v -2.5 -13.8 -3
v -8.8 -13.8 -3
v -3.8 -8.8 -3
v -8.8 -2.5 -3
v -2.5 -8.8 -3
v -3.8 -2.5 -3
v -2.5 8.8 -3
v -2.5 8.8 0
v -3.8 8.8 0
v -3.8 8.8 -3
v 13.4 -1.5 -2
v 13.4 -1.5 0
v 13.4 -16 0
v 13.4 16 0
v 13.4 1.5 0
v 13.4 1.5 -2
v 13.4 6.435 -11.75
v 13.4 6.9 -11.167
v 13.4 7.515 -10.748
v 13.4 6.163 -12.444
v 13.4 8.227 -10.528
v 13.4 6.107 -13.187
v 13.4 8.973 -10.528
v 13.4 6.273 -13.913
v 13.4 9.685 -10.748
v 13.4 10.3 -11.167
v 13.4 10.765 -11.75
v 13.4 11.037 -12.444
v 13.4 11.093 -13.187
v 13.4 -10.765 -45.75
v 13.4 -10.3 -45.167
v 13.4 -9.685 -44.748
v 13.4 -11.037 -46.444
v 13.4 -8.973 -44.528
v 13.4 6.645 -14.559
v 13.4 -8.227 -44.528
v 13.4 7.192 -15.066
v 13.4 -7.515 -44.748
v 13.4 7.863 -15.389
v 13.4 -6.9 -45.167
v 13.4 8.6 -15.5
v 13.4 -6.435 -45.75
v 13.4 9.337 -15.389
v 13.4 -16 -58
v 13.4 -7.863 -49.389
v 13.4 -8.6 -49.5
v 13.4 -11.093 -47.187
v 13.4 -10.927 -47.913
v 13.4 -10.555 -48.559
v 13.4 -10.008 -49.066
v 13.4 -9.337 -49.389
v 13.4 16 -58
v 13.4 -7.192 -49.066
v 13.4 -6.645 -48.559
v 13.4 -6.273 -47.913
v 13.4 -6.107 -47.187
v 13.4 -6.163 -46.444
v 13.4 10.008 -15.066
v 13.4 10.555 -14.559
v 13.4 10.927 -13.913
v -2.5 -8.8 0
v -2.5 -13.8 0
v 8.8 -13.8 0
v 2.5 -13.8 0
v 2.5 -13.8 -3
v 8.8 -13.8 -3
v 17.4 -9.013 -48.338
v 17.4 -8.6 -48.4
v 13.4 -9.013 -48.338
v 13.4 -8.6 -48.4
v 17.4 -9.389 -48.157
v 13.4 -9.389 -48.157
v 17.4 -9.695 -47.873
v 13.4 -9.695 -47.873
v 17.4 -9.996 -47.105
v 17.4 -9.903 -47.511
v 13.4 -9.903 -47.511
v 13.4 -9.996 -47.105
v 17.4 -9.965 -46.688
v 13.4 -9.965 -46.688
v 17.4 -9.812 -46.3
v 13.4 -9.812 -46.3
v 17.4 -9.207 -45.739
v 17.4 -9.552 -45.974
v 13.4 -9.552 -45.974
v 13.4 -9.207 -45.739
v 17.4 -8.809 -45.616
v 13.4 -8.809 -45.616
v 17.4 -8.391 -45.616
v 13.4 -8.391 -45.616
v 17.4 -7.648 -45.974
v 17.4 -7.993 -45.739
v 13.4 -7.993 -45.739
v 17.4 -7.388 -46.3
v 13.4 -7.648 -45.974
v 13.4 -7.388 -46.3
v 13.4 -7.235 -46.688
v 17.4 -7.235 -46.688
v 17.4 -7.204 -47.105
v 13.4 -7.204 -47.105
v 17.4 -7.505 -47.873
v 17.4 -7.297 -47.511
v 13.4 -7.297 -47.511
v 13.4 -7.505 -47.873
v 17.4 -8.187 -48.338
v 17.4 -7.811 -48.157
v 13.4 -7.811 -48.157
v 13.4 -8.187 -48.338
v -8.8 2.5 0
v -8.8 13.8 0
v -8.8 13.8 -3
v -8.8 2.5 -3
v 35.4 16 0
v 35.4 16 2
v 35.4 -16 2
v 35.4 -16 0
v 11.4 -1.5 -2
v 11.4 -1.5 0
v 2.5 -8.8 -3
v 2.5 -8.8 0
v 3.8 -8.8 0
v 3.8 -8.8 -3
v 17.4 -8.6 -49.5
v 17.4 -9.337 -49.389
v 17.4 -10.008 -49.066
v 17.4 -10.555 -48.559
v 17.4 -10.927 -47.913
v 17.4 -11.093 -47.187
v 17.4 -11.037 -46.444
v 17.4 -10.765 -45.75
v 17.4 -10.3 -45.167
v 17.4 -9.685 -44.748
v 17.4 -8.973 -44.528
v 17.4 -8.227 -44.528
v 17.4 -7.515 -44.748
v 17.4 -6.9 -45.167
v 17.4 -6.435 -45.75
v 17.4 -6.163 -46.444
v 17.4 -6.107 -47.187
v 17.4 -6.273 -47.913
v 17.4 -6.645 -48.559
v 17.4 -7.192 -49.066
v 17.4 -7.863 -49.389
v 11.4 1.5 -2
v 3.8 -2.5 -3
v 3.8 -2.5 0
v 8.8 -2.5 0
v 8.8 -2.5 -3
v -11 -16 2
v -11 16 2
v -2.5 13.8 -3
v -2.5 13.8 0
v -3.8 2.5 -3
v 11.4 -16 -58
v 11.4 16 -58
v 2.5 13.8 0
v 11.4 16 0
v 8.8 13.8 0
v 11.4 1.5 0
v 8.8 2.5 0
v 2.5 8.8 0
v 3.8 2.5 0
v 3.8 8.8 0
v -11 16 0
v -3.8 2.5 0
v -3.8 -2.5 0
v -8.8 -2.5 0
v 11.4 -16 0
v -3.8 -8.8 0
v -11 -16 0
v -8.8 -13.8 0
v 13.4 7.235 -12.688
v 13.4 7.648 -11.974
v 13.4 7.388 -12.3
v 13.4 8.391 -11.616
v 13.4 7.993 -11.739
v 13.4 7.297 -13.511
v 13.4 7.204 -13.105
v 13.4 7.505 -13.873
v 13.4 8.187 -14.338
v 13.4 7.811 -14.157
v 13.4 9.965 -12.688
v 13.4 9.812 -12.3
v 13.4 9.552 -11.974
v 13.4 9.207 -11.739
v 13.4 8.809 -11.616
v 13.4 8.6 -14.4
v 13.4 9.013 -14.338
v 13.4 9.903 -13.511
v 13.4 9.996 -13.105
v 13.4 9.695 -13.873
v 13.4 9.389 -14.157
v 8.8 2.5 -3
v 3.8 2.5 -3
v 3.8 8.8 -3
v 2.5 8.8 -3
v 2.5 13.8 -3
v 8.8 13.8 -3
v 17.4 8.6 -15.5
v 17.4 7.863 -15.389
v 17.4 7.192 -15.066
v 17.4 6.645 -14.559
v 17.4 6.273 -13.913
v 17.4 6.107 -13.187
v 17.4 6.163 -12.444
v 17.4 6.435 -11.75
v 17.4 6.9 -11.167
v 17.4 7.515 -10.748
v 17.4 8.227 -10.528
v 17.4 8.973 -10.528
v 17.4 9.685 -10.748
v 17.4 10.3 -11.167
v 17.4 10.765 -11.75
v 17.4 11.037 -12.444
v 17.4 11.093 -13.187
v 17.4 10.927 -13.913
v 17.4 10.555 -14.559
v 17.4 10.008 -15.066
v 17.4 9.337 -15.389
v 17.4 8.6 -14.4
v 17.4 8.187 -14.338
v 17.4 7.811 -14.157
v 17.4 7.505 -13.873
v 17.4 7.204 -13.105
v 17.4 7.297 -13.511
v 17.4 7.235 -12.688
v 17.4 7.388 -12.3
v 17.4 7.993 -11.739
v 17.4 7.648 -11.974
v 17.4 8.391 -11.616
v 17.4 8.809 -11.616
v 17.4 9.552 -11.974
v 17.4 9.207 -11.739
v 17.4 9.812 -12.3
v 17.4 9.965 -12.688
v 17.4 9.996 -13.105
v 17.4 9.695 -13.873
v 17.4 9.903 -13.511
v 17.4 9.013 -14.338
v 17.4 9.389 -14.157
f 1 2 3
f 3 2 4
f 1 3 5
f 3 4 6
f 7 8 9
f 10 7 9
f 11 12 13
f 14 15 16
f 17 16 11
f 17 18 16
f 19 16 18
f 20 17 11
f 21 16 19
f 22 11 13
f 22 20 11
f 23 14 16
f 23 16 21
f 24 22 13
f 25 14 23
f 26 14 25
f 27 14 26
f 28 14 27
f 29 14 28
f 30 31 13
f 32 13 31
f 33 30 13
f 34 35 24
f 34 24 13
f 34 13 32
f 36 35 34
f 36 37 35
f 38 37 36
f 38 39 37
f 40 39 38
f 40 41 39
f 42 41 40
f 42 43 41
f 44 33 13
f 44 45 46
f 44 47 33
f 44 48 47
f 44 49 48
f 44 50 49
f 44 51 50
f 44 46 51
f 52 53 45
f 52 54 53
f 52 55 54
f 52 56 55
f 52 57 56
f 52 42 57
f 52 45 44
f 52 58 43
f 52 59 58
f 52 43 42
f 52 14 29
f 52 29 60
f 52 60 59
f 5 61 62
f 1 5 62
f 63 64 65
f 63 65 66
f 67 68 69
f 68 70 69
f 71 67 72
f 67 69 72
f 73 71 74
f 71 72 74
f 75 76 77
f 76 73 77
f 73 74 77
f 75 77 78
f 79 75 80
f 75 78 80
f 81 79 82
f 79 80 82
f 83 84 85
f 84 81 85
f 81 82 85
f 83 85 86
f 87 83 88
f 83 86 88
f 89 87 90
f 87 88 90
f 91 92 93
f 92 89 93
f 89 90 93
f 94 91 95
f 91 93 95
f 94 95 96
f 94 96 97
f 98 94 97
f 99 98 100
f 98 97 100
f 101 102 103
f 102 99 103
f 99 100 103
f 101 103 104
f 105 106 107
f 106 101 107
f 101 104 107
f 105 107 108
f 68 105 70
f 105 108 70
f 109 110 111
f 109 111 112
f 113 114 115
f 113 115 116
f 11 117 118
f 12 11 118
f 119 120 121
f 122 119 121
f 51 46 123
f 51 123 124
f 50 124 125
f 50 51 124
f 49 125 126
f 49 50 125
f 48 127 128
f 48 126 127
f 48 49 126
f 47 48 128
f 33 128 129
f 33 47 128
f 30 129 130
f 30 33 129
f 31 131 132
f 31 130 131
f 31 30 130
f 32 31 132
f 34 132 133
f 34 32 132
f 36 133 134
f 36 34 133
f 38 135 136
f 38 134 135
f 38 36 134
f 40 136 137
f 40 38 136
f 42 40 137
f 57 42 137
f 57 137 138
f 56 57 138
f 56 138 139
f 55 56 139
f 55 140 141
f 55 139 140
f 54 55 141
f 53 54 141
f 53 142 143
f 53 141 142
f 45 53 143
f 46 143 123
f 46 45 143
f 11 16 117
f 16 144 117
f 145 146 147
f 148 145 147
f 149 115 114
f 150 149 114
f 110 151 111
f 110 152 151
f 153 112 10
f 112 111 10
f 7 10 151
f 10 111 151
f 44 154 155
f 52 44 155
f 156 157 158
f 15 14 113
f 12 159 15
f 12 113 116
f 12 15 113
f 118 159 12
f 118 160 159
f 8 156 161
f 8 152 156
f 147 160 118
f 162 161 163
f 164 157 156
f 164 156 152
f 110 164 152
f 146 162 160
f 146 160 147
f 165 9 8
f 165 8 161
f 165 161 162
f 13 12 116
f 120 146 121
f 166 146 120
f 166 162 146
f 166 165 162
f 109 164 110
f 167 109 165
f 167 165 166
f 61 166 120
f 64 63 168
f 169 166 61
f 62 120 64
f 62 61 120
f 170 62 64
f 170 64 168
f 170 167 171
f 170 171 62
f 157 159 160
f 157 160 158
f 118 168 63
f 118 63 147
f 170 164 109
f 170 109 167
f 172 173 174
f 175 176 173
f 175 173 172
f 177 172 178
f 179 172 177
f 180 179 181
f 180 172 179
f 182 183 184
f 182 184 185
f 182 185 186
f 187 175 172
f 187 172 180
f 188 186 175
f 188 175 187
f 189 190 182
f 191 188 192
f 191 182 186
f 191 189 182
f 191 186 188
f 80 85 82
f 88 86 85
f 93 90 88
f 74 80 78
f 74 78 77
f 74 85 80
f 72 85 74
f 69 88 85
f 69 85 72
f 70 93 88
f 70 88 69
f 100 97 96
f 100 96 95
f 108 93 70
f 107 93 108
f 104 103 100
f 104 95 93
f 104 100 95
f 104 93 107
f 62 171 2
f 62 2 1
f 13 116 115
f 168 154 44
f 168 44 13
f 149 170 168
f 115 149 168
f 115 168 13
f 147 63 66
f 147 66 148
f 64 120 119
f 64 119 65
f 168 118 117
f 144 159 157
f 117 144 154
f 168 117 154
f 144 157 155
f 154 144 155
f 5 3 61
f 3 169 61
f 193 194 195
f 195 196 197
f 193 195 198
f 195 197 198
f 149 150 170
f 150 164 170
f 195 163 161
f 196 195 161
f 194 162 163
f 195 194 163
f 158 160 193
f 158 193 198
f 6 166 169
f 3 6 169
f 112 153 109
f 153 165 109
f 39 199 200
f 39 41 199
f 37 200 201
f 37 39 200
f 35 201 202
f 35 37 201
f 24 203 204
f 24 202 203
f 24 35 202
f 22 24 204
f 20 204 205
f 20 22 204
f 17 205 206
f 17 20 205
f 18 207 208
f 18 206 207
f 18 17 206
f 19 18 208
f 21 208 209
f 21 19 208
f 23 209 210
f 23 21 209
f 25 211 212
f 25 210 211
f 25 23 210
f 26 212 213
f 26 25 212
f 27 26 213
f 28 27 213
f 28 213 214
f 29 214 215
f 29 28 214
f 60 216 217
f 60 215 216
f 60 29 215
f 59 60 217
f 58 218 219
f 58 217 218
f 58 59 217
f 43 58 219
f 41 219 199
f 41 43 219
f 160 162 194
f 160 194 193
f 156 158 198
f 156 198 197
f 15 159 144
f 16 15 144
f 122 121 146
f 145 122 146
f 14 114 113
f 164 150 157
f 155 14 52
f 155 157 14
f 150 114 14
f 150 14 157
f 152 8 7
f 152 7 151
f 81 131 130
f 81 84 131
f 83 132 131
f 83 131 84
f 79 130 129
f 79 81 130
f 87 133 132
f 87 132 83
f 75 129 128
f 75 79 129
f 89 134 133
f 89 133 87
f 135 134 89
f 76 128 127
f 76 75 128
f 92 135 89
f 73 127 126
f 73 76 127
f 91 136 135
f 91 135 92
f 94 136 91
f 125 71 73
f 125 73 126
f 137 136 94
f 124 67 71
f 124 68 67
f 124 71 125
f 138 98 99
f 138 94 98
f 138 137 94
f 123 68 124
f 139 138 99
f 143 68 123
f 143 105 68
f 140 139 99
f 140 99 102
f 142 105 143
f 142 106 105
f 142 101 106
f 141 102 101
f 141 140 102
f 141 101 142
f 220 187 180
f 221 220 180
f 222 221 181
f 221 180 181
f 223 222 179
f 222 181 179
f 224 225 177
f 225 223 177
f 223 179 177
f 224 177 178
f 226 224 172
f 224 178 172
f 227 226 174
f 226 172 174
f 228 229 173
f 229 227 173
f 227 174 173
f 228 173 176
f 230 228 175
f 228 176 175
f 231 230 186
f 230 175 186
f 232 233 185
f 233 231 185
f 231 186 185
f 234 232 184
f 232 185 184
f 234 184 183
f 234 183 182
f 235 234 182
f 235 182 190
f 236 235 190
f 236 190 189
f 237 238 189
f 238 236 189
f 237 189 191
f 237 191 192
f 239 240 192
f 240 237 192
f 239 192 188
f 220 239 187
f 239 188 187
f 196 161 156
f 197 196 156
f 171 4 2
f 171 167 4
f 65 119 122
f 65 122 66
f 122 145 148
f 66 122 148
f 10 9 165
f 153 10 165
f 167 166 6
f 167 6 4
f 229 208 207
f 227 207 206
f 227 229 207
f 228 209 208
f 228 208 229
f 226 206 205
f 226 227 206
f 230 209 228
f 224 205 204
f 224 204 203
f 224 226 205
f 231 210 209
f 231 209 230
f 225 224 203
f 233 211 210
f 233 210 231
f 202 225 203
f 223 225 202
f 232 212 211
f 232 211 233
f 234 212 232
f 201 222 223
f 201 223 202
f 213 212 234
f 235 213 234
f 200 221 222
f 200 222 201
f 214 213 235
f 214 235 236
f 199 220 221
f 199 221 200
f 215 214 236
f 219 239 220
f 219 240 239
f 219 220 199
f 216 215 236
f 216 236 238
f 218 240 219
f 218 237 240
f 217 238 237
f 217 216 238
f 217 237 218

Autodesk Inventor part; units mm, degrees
ref_plane "YZ Plane" through (0, 0, 0) normal (1, 0, 0) x (0, 1, 0)
ref_plane "XZ Plane" through (0, 0, 0) normal (0, 1, 0) x (-1, 0, 0)
ref_plane "XY Plane" through (0, 0, 0) normal (0, 0, 1) x (1, 0, 0)
sketch "Sketch1" plane through (0, 0, 0) normal (0, 0, 1) x (1, 0, 0)
  line L0 (8.8, 13.8) -> (-8.8, 13.8)
  line L1 (-8.8, 13.8) -> (-8.8, -13.8)
  line L2 (-8.8, -13.8) -> (8.8, -13.8)
  line L3 (8.8, -13.8) -> (8.8, 13.8)
  line L4 (8.8, 13.8) -> (-8.8, -13.8) construction
  line L5 (-8.8, 13.8) -> (8.8, -13.8) construction
  line L6 (8.8, 0) -> (-8.8, 0) construction
  line L7 (2.5, -13.8) -> (-2.5, -13.8)
  line L8 (-2.5, -8.8) -> (2.5, -8.8)
  line L9 (2.5, -8.8) -> (2.5, -13.8)
  line L10 (2.5, -13.8) -> (-2.5, -8.8) construction
  line L11 (-2.5, -13.8) -> (2.5, -8.8) construction
  line L12 (-2.5, -8.8) -> (-2.5, -13.8)
  line L13 (3.8, -2.5) -> (8.8, -2.5)
  line L14 (3.8, 8.8) -> (-3.8, 8.8)
  line L15 (-3.8, 8.8) -> (-3.8, -8.8)
  line L16 (-3.8, -8.8) -> (3.8, -8.8)
  line L17 (3.8, -8.8) -> (3.8, 8.8)
  line L18 (3.8, 8.8) -> (-3.8, -8.8) construction
  line L19 (-3.8, 8.8) -> (3.8, -8.8) construction
  line L20 (-3.8, -2.5) -> (-8.8, -2.5)
  line L21 (2.5, 13.8) -> (-2.5, 13.8)
  line L22 (-2.5, 8.8) -> (2.5, 8.8)
  line L23 (2.5, 8.8) -> (2.5, 13.8)
  line L24 (2.5, 13.8) -> (-2.5, 8.8) construction
  line L25 (-2.5, 13.8) -> (2.5, 8.8) construction
  line L26 (-2.5, 8.8) -> (-2.5, 13.8)
  line L27 (3.8, 2.5) -> (8.8, 2.5)
  line L28 (-3.8, 2.5) -> (-8.8, 2.5)
  point P0 (0, 0)
  dimension "d0" = 17.6
  dimension "d1" = 27.6
  dimension "d5" = 5
  dimension "d7" = 7.6
  dimension "d8" = 17.6
extrude "Extrusion1" add sketch "Sketch1" against normal blind 3 contours L3 L27 L17 L14 L23 L0 | L26 L14 L15 L28 L1 L0 | L3 L2 L9 L16 L17 L13 | L20 L15 L16 L12 L2 L1
sketch "Sketch2" plane through (0, 0, 0) normal (0, 0, 1) x (1, 0, 0)
  line L0 (11, 16) -> (-11, 16)
  line L1 (-11, 16) -> (-11, -16)
  line L2 (-11, -16) -> (11, -16)
  line L3 (11, -16) -> (11, 16)
  line L4 (11, 16) -> (-11, -16) construction
  line L5 (-11, 16) -> (11, -16) construction
  line L6 (11, 16) -> (11.4, 16)
  line L7 (11.4, 16) -> (11.4, -16)
  line L8 (11.4, -16) -> (11, -16)
  line L9 (11, -16) -> (11, 16)
  point P0 (0, 0)
  dimension "d11" = 22
  dimension "d12" = 32
  dimension "d18" = 0.4
extrude "Extrusion2" add sketch "Sketch2" along normal blind 2
sketch "Sketch3" plane through (11.4, -16, 0) normal (1, 0, 0) x (0, 0, -1)
  line L0 (-2, 32) -> (-2, 0) projected
  line L1 (-2, 0) -> (58, 0)
  line L2 (58, 0) -> (58, 32)
  line L3 (58, 32) -> (-2, 32)
  line L4 (-2, 32) -> (-2, 0)
  point P0 (0, 16)
  dimension "d15" = 60
extrude "Extrusion3" add sketch "Sketch3" along normal blind 2
sketch "Sketch5" plane through (11.4, -16, 0) normal (-1, 0, 0) x (0, 0, 1)
  line L0 (-2, 14.5) -> (0, 14.5)
  line L1 (0, 14.5) -> (0, 17.5)
  line L2 (0, 17.5) -> (-2, 17.5)
  line L3 (-2, 17.5) -> (-2, 14.5)
  point P0 (0, 16)
  point P1 (0, 16)
  dimension "d19" = 2
  dimension "d20" = 3
extrude "Extrusion4" cut sketch "Sketch5" against normal up to surface (2 mm away)
sketch "Sketch6" plane through (13.4, -16, 0) normal (1, 0, 0) x (0, 0, -1)
  line L0 (0, 32) -> (0, 0) projected
  line L1 (-2, 32) -> (0, 32)
  line L2 (0, 32) -> (0, 0)
  line L3 (0, 0) -> (-2, 0)
  line L4 (-2, 0) -> (-2, 32)
  point P0 (0, 16)
extrude "Extrusion5" add sketch "Sketch6" along normal blind 22
sketch "Sketch7" plane through (13.4, -16, 0) normal (1, 0, 0) x (0, 0, -1)
  line L0 (0, 0) -> (58, 0) projected
  line L1 (58, 0) -> (58, 32) projected
  line L2 (58, 32) -> (0, 32) projected
  line L3 (54.5, 28) -> (5.5, 28) construction
  line L4 (5.5, 28) -> (5.5, 4) construction
  line L5 (5.5, 4) -> (54.5, 4) construction
  line L6 (54.5, 4) -> (54.5, 28) construction
  line L7 (54.5, 28) -> (5.5, 4) construction
  line L8 (5.5, 28) -> (54.5, 4) construction
  circle A0 centre (47, 7.4) radius 2.5
  circle A1 centre (47, 7.4) radius 1.4
  circle A2 centre (13, 24.6) radius 2.5
  circle A3 centre (13, 24.6) radius 1.4
  line L9 (0, 0) -> (58, 0) projected
  line L10 (58, 0) -> (58, 32) projected
  line L11 (2, 0) -> (58, 32) construction
  point P0 (30, 16)
  point P1 (30, 16)
  dimension "d37" = 49
  dimension "d38" = 24
  dimension "d39" = 5
  dimension "d40" = 2.8
  dimension "d41" = 5
  dimension "d42" = 2.8
  dimension "d43" = 3.4
  dimension "d44" = 7.5
  dimension "d45" = 3.4
  dimension "d46" = 7.5
extrude "Extrusion6" add sketch "Sketch7" along normal blind 4
properties part number "prototype_5_testPart1_3DPrint"
